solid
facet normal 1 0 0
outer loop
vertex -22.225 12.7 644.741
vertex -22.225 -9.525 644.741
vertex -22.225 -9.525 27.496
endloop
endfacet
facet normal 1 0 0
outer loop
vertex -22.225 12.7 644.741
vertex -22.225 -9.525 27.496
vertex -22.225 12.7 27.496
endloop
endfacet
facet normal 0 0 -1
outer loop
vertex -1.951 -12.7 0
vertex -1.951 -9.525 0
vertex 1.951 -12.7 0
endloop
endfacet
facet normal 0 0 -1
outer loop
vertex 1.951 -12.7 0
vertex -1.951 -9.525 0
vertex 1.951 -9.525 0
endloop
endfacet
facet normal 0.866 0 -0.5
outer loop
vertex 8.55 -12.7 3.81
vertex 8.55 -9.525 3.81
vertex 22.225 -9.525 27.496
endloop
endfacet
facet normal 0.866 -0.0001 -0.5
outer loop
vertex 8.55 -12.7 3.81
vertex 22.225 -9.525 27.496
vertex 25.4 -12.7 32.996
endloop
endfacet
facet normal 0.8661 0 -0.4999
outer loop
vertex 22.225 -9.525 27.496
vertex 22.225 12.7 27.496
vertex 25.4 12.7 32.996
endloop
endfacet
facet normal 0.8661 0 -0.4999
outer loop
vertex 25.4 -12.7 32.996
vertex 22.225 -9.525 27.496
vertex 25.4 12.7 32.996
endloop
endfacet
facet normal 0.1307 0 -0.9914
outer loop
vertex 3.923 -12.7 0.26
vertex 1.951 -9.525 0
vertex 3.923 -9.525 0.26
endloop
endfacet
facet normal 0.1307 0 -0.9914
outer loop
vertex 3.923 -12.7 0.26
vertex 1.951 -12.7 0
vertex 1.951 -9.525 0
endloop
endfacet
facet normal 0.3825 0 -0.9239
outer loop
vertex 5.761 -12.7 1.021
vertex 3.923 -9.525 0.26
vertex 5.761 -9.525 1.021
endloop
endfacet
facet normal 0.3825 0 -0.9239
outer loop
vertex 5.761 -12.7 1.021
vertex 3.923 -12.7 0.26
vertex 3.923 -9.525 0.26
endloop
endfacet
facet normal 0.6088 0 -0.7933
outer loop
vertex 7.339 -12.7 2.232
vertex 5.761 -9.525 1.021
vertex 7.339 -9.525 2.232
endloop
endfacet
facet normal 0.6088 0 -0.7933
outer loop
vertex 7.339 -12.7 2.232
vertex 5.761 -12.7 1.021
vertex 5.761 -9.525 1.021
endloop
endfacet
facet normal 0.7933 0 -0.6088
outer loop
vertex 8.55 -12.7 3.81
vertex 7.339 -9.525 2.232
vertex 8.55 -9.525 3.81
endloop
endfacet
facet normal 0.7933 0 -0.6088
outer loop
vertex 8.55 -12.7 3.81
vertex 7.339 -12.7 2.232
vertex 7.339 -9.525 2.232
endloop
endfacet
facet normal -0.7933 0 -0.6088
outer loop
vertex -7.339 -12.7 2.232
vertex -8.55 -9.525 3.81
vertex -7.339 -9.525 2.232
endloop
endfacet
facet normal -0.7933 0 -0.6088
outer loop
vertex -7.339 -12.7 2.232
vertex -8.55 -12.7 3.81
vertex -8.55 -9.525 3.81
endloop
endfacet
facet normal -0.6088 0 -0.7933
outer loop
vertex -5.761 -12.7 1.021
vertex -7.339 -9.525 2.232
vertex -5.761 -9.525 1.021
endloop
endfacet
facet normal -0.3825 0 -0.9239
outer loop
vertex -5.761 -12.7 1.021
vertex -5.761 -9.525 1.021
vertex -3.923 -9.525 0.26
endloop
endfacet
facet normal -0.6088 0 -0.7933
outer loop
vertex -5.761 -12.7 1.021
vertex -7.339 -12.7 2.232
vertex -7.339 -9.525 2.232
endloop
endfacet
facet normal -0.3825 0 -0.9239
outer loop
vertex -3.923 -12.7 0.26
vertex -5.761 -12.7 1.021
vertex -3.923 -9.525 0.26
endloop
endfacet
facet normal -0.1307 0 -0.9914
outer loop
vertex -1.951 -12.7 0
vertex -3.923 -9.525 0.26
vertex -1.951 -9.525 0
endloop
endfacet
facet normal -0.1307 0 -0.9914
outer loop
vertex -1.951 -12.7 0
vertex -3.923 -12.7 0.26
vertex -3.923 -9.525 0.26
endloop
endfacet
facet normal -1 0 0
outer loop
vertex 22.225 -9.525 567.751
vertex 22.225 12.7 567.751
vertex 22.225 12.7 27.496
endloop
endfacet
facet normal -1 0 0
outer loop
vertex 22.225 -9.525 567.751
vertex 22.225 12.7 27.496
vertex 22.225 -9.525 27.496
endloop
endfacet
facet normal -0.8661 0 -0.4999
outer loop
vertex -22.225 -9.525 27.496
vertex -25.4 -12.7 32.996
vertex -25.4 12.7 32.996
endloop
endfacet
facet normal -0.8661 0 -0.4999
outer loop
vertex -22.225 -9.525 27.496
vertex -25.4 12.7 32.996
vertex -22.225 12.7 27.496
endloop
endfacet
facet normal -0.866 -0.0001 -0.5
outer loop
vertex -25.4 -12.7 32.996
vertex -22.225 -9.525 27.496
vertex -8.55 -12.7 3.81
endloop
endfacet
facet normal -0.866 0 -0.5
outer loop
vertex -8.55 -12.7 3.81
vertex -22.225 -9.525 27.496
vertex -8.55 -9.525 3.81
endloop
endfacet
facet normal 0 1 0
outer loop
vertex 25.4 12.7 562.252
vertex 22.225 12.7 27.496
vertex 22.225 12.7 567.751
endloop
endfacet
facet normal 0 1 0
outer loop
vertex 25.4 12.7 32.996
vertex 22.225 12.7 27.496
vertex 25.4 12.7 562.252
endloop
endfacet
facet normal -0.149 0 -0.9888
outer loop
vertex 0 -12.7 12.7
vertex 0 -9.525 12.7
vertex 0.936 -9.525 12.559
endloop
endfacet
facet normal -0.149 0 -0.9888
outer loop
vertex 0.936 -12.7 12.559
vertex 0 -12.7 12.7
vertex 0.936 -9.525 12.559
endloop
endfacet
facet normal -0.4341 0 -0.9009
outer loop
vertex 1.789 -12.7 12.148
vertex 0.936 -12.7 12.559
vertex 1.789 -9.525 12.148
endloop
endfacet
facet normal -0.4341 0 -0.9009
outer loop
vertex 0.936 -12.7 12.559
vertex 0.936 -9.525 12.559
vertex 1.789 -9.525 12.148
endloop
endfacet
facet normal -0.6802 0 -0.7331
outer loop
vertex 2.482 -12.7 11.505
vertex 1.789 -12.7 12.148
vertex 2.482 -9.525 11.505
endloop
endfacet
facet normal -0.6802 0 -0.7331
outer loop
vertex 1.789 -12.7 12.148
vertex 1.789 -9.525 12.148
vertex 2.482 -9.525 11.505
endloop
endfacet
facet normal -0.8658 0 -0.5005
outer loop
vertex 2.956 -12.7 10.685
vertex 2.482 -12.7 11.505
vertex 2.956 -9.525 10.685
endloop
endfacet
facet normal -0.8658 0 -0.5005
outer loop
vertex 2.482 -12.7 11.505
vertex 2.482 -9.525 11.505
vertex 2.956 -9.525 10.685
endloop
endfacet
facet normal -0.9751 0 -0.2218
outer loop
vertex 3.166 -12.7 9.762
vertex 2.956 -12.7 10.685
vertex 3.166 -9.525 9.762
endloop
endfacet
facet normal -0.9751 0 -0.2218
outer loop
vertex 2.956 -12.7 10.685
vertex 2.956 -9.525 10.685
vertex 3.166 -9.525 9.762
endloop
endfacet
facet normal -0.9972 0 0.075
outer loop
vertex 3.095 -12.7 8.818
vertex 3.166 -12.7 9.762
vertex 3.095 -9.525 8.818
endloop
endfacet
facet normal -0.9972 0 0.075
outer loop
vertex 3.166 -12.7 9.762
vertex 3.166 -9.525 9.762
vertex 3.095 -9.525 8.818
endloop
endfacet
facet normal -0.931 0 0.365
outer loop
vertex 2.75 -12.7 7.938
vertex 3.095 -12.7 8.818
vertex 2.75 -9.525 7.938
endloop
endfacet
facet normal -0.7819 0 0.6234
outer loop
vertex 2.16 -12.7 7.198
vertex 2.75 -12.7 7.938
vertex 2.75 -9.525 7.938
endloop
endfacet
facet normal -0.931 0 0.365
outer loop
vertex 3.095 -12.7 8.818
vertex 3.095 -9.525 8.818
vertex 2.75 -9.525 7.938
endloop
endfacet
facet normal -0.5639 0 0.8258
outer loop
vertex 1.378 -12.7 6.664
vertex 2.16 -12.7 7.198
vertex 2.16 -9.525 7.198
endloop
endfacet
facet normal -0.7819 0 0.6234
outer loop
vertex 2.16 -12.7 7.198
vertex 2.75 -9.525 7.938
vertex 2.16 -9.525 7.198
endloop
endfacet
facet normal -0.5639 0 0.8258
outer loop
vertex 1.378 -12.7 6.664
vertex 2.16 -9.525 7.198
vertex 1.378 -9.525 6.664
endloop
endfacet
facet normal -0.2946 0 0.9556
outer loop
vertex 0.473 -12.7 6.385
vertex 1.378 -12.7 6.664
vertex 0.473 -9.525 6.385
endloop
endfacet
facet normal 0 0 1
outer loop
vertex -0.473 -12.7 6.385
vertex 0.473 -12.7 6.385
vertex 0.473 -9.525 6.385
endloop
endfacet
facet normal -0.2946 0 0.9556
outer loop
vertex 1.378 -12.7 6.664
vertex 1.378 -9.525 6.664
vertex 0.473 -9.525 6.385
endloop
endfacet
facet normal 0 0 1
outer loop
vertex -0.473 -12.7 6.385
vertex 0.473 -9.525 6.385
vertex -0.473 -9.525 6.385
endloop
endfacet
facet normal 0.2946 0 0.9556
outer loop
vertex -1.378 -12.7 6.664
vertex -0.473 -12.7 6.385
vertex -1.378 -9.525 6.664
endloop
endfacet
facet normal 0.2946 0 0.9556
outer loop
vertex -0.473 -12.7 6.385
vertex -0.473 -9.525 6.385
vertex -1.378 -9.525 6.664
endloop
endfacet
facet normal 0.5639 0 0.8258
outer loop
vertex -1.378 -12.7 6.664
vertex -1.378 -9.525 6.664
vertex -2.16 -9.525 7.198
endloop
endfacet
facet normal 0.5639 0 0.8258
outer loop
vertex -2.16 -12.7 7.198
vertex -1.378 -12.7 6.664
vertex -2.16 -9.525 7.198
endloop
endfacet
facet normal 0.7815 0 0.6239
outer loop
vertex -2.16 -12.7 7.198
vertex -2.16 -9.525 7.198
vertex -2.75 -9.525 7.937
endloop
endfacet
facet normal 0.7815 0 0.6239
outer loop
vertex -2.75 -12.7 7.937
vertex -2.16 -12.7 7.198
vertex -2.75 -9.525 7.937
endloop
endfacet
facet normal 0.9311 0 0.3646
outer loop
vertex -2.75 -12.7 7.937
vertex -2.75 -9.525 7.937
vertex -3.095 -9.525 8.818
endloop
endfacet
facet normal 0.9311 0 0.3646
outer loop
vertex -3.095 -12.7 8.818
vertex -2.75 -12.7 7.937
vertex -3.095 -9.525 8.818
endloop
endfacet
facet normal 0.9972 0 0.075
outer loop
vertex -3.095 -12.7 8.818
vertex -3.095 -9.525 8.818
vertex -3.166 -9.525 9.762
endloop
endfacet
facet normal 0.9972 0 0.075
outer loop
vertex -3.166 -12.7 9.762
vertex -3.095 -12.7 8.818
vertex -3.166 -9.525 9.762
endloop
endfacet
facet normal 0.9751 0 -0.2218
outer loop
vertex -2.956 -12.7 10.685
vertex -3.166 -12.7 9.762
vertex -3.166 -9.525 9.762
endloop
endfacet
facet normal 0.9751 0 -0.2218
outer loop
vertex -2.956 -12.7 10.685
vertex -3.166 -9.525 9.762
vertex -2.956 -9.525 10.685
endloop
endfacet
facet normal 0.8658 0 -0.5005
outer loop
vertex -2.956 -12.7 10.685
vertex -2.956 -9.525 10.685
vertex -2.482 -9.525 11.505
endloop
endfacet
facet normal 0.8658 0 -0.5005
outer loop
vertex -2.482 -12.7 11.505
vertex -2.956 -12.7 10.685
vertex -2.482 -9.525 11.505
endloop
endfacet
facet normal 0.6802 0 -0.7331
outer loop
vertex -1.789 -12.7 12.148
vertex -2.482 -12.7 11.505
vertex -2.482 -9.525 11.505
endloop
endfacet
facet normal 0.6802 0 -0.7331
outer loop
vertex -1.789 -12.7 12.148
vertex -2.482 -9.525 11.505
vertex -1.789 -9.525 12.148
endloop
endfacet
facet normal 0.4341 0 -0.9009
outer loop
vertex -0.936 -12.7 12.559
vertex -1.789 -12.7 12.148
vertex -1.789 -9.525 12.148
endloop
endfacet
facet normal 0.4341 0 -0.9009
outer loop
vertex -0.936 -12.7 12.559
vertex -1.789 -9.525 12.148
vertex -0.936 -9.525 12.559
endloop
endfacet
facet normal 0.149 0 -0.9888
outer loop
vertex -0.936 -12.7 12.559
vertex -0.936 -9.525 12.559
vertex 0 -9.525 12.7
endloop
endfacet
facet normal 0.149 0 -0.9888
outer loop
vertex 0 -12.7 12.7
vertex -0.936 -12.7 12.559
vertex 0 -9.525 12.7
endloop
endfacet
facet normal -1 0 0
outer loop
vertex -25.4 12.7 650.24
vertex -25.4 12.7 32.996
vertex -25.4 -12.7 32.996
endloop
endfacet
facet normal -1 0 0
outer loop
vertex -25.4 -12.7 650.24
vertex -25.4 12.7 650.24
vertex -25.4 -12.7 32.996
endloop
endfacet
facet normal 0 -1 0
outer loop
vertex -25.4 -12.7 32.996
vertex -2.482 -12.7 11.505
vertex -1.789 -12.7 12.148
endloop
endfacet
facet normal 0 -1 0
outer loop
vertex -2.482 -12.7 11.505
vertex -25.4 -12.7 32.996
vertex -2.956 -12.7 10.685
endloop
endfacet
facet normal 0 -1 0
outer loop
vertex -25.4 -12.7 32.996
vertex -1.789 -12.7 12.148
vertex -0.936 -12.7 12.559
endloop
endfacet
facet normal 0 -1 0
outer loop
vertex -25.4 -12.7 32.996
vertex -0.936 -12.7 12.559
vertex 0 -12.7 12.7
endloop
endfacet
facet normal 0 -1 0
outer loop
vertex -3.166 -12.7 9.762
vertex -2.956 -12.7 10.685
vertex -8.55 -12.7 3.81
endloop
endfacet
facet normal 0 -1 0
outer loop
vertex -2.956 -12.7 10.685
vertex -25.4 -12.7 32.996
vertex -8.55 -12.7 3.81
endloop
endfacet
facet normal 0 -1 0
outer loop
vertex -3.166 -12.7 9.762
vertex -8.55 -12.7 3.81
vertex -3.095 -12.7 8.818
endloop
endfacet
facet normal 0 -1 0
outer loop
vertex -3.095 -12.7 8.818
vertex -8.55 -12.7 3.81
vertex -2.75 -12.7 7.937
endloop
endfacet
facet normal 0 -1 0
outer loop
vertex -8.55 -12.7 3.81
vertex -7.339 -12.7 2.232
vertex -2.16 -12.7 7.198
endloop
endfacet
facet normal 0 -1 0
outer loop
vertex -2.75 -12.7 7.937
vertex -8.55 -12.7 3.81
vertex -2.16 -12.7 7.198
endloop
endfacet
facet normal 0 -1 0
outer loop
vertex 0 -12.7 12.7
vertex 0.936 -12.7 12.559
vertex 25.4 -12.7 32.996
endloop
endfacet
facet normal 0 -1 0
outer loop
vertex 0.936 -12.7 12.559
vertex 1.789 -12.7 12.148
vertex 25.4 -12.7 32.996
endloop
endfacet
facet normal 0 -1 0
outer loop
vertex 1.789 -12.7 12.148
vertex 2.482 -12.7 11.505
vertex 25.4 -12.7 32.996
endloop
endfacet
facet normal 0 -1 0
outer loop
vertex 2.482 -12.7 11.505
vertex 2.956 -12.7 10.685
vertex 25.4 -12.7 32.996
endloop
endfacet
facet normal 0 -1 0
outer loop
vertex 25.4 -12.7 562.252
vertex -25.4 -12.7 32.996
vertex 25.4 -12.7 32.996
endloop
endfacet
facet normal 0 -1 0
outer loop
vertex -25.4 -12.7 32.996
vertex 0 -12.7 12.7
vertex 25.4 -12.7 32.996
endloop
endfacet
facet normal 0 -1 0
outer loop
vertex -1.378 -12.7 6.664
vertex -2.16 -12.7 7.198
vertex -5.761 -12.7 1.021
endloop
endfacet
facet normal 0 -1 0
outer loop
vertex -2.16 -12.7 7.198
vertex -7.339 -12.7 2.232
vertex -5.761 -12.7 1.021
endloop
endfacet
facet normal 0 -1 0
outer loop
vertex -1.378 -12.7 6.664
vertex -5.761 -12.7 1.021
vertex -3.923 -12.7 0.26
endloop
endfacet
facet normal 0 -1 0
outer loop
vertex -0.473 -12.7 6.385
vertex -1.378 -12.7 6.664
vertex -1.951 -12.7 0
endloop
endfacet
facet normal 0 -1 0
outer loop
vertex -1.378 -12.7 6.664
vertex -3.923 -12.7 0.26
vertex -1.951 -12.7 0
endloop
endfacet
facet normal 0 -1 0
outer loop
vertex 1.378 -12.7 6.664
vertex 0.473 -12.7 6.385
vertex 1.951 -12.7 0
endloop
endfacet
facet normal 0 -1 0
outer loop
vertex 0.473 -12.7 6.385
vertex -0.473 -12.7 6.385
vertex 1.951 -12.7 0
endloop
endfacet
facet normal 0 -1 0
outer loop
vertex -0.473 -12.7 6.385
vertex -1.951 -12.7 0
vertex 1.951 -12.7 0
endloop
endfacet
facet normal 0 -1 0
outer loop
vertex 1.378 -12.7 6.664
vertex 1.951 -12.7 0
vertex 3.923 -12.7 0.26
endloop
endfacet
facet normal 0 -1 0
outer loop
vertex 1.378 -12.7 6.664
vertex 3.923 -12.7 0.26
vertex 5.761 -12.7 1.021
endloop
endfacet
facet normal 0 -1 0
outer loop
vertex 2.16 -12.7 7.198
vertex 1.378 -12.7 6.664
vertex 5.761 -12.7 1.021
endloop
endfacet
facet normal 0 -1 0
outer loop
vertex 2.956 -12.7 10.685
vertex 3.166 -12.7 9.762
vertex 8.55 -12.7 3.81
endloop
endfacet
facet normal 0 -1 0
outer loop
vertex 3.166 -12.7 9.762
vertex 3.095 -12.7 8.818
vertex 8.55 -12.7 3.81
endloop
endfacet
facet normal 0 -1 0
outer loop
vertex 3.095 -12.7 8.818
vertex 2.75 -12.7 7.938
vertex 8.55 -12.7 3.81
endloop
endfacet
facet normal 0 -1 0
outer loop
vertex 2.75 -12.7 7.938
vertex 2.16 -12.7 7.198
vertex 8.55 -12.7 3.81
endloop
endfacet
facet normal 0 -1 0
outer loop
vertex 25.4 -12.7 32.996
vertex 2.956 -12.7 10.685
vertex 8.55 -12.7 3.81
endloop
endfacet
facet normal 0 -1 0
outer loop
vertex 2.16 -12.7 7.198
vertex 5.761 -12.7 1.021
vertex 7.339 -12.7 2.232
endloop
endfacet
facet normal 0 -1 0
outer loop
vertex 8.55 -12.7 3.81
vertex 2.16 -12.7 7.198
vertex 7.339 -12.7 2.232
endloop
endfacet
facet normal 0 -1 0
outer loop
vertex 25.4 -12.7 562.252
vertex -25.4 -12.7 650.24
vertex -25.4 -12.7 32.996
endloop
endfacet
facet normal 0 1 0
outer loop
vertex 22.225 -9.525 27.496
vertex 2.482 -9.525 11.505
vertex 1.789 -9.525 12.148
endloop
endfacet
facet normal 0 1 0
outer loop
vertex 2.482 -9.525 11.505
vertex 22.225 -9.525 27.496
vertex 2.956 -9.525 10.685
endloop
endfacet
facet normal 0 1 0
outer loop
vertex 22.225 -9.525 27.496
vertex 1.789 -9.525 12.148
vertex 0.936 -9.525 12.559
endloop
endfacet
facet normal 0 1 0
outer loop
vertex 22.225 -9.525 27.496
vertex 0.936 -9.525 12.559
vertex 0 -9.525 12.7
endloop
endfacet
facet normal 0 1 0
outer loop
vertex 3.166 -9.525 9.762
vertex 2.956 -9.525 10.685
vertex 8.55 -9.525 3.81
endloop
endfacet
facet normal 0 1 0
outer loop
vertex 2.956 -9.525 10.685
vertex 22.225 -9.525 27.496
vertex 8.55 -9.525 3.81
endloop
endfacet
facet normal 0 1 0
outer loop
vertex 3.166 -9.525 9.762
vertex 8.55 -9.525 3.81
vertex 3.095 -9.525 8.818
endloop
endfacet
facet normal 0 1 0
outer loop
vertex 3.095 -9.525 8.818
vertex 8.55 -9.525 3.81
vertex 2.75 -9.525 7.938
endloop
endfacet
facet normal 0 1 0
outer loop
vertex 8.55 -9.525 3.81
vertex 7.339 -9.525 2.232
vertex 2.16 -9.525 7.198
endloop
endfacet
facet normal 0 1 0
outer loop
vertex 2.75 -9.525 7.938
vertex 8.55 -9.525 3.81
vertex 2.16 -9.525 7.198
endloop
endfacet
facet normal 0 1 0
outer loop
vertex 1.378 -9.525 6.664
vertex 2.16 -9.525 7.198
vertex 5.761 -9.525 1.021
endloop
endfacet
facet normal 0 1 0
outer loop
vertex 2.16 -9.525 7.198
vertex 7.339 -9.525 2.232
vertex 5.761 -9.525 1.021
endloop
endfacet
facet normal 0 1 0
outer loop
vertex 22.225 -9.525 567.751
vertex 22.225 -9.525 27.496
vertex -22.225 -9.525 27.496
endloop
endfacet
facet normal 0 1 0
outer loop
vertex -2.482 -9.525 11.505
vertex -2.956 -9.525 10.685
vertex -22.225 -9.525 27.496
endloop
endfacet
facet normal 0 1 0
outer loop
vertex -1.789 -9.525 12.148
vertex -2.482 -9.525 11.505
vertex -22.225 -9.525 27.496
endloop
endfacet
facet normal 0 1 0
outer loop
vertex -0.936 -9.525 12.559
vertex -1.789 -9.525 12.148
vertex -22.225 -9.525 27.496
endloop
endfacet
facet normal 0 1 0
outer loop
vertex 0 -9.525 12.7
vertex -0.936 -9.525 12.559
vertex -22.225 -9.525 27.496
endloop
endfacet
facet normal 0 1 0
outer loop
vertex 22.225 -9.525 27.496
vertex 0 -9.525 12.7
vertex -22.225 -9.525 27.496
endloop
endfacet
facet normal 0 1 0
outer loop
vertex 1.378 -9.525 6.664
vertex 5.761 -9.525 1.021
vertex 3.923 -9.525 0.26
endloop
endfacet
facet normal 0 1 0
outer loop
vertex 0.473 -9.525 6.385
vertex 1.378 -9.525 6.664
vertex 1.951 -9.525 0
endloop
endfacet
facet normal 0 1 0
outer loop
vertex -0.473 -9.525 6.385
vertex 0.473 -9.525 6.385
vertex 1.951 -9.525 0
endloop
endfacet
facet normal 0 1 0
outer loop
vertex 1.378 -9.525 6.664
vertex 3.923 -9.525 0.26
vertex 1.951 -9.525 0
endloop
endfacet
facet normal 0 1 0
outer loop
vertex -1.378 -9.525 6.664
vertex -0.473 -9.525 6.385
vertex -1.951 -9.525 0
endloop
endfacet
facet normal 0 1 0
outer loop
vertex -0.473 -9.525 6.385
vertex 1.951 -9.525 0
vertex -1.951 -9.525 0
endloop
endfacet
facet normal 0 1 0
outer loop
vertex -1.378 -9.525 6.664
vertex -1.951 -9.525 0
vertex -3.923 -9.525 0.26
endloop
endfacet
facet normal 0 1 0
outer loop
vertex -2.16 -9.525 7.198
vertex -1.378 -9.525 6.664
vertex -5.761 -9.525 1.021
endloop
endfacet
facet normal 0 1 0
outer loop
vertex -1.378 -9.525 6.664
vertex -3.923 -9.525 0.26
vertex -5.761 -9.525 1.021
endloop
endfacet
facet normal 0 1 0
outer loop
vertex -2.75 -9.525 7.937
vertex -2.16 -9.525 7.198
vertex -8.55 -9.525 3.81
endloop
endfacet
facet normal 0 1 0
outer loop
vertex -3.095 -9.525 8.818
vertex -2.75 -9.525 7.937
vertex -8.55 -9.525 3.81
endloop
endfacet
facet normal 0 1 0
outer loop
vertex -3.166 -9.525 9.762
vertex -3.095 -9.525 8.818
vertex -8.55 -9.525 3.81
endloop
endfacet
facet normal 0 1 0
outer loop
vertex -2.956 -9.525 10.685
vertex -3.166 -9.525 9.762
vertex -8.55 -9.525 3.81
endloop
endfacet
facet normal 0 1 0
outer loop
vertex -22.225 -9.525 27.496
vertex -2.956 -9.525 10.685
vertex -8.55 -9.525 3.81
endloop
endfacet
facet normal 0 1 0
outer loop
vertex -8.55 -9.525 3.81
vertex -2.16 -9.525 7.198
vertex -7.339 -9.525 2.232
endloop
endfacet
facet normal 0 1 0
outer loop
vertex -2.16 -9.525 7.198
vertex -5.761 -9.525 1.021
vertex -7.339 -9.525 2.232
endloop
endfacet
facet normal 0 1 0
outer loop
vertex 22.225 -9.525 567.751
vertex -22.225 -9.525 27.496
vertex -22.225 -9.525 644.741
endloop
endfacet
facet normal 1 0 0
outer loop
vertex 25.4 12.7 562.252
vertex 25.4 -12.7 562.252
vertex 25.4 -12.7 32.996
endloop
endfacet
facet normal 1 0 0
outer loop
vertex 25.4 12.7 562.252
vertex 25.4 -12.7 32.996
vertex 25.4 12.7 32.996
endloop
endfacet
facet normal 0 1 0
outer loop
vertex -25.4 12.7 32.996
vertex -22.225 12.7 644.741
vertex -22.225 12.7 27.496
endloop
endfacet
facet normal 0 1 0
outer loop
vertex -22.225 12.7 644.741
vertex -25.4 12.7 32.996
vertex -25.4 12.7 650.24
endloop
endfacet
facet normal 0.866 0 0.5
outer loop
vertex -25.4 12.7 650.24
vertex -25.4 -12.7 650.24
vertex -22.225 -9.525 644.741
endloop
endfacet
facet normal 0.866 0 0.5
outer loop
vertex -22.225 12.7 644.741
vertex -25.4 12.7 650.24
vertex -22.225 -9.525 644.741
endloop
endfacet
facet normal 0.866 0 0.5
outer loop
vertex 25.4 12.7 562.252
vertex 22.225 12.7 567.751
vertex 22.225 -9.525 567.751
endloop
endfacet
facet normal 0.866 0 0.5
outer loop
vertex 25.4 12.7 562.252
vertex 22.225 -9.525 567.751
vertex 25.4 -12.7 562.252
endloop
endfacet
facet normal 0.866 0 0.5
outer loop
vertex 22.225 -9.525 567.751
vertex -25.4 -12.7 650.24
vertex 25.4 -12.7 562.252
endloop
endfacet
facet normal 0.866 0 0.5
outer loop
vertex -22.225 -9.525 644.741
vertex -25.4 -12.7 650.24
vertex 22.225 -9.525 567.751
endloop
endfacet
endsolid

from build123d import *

# Parameters (mm, degrees)
BOSS_EXTRUDE1_DEPTH = 650.24
CUT_EXTRUDE1_DEPTH  = 652.231431674
SKETCH3_R           = 3.175
CUT_EXTRUDE2_DEPTH  = 652.231431674
FILLET1_R           = 7.62


with BuildPart() as part:
    # Sketch1 → Boss-Extrude1 (new body)
    with BuildSketch(Plane.XY):
        Polygon((-22.225, -9.525), (-22.225, 12.7), (-25.4, 12.7), (-25.4, -12.7), (25.4, -12.7), (25.4, 12.7), (22.225, 12.7), (22.225, -9.525), align=None)
    extrude(amount=BOSS_EXTRUDE1_DEPTH)

    # Sketch2 → Cut-Extrude1 (cut, through all)
    with BuildSketch(Plane.XZ.offset(12.7)):
        Polygon((-25.4, 650.24), (25.4, 562.251818976), (25.4, 650.24), align=None)
    extrude(amount=-CUT_EXTRUDE1_DEPTH, mode=Mode.SUBTRACT)

    # Sketch3 → Cut-Extrude2 (cut, through all)
    with BuildSketch(Plane(origin=(0, 12.7, 0), x_dir=(1, 0, 0), z_dir=(0, 1, 0))):
        with Locations(Location((0, -9.525, 0), (0, 0, 270))):
            Circle(SKETCH3_R)
        Polygon((-6.35, 0), (6.35, 0), (25.4, -32.995567884), (25.4, 20.936285304), (-25.4, 20.936285304), (-25.4, -32.995567884), align=None)
    extrude(amount=-CUT_EXTRUDE2_DEPTH, mode=Mode.SUBTRACT)

    # Fillet1
    fillet1_edges = [part.edges().sort_by_distance(p)[0] for p in [
        (6.35, -11.1125, 0),
        (-6.35, -11.1125, 0),
    ]]
    fillet(fillet1_edges, radius=FILLET1_R)


solid = part.part
